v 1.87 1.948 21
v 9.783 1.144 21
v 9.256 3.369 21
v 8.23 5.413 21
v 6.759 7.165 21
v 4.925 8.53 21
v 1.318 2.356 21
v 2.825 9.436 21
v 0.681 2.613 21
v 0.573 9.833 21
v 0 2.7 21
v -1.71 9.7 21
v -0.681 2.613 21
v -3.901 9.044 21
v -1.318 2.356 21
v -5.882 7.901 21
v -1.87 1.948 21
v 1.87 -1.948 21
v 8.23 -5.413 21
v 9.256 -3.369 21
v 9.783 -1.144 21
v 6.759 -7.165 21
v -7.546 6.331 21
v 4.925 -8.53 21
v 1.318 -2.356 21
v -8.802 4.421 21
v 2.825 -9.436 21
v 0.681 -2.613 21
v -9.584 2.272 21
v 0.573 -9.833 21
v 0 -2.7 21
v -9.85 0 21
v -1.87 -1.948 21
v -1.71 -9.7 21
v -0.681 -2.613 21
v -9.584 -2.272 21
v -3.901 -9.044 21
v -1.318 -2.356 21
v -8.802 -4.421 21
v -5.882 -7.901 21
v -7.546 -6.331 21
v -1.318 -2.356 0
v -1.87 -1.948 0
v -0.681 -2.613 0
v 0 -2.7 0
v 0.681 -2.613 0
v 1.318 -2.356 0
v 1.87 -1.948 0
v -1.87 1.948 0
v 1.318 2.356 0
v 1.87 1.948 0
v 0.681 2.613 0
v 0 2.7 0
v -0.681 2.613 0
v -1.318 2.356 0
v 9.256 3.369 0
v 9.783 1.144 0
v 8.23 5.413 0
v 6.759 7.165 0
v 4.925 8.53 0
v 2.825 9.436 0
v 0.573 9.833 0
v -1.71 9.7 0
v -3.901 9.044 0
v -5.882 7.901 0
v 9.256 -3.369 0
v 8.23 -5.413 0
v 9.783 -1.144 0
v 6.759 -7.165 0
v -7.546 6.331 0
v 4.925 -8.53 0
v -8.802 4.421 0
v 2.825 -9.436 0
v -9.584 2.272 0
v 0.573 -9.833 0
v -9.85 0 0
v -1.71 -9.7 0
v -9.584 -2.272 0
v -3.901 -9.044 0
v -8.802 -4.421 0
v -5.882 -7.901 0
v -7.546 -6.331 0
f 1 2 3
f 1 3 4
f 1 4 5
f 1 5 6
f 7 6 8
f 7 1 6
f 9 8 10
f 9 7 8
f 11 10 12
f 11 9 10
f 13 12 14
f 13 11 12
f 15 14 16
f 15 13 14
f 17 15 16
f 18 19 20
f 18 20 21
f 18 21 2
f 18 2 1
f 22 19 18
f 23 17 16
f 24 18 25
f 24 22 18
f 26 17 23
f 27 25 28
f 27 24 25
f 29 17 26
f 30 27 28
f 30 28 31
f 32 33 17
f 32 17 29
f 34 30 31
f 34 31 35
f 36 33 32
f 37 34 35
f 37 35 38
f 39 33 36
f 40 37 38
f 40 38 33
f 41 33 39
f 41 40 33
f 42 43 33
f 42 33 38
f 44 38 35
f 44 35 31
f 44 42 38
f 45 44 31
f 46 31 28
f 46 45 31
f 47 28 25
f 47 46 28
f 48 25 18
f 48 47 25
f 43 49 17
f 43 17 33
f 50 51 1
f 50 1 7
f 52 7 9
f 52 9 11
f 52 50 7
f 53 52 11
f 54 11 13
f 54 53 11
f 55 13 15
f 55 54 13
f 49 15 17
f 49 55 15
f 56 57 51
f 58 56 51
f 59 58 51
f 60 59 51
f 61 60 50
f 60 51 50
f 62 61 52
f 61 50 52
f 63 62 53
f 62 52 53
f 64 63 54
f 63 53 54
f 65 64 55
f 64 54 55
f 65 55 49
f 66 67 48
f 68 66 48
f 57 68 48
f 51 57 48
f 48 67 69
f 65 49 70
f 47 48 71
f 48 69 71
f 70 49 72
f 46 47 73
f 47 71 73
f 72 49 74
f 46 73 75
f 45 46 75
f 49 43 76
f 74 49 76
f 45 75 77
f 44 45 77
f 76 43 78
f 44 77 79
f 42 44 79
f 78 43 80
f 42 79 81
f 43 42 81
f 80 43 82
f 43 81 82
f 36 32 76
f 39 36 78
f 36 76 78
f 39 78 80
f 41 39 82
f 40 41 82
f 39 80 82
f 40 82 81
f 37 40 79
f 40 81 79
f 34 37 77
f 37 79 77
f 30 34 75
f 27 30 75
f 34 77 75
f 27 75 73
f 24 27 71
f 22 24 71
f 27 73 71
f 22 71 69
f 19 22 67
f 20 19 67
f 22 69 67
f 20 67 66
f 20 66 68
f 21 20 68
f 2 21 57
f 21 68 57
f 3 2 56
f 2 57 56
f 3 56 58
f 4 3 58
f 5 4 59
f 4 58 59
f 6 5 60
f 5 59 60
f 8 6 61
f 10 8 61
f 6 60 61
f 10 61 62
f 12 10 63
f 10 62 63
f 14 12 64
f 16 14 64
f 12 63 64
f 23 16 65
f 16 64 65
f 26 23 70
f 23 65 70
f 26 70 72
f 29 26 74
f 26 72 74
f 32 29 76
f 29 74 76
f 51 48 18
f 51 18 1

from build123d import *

# Parameters (mm, degrees)
CROQUIS1_R              = 9.85
SALIENTE_EXTRUIR2_DEPTH = 21
CORTAR_EXTRUIR1_DEPTH   = 21


with BuildPart() as part:
    # Croquis1 → Saliente-Extruir2 (new body)
    with BuildSketch(Plane.XY):
        with Locations(Location((0, 0, 0), (0, 0, 180))):
            Circle(CROQUIS1_R)
    extrude(amount=SALIENTE_EXTRUIR2_DEPTH)

    # Croquis2 → Cortar-Extruir1 (cut)
    with BuildSketch(Plane.XY):
        with BuildLine():
            Line((-1.87, 1.947588252), (-1.87, -1.947588252))
            ThreePointArc((-1.87, -1.947588252), (0, -2.7), (1.87, -1.947588252))
            Line((1.87, -1.947588252), (1.87, 1.947588252))
            ThreePointArc((1.87, 1.947588252), (0, 2.7), (-1.87, 1.947588252))
        make_face()
    extrude(amount=CORTAR_EXTRUIR1_DEPTH, mode=Mode.SUBTRACT)


solid = part.part
